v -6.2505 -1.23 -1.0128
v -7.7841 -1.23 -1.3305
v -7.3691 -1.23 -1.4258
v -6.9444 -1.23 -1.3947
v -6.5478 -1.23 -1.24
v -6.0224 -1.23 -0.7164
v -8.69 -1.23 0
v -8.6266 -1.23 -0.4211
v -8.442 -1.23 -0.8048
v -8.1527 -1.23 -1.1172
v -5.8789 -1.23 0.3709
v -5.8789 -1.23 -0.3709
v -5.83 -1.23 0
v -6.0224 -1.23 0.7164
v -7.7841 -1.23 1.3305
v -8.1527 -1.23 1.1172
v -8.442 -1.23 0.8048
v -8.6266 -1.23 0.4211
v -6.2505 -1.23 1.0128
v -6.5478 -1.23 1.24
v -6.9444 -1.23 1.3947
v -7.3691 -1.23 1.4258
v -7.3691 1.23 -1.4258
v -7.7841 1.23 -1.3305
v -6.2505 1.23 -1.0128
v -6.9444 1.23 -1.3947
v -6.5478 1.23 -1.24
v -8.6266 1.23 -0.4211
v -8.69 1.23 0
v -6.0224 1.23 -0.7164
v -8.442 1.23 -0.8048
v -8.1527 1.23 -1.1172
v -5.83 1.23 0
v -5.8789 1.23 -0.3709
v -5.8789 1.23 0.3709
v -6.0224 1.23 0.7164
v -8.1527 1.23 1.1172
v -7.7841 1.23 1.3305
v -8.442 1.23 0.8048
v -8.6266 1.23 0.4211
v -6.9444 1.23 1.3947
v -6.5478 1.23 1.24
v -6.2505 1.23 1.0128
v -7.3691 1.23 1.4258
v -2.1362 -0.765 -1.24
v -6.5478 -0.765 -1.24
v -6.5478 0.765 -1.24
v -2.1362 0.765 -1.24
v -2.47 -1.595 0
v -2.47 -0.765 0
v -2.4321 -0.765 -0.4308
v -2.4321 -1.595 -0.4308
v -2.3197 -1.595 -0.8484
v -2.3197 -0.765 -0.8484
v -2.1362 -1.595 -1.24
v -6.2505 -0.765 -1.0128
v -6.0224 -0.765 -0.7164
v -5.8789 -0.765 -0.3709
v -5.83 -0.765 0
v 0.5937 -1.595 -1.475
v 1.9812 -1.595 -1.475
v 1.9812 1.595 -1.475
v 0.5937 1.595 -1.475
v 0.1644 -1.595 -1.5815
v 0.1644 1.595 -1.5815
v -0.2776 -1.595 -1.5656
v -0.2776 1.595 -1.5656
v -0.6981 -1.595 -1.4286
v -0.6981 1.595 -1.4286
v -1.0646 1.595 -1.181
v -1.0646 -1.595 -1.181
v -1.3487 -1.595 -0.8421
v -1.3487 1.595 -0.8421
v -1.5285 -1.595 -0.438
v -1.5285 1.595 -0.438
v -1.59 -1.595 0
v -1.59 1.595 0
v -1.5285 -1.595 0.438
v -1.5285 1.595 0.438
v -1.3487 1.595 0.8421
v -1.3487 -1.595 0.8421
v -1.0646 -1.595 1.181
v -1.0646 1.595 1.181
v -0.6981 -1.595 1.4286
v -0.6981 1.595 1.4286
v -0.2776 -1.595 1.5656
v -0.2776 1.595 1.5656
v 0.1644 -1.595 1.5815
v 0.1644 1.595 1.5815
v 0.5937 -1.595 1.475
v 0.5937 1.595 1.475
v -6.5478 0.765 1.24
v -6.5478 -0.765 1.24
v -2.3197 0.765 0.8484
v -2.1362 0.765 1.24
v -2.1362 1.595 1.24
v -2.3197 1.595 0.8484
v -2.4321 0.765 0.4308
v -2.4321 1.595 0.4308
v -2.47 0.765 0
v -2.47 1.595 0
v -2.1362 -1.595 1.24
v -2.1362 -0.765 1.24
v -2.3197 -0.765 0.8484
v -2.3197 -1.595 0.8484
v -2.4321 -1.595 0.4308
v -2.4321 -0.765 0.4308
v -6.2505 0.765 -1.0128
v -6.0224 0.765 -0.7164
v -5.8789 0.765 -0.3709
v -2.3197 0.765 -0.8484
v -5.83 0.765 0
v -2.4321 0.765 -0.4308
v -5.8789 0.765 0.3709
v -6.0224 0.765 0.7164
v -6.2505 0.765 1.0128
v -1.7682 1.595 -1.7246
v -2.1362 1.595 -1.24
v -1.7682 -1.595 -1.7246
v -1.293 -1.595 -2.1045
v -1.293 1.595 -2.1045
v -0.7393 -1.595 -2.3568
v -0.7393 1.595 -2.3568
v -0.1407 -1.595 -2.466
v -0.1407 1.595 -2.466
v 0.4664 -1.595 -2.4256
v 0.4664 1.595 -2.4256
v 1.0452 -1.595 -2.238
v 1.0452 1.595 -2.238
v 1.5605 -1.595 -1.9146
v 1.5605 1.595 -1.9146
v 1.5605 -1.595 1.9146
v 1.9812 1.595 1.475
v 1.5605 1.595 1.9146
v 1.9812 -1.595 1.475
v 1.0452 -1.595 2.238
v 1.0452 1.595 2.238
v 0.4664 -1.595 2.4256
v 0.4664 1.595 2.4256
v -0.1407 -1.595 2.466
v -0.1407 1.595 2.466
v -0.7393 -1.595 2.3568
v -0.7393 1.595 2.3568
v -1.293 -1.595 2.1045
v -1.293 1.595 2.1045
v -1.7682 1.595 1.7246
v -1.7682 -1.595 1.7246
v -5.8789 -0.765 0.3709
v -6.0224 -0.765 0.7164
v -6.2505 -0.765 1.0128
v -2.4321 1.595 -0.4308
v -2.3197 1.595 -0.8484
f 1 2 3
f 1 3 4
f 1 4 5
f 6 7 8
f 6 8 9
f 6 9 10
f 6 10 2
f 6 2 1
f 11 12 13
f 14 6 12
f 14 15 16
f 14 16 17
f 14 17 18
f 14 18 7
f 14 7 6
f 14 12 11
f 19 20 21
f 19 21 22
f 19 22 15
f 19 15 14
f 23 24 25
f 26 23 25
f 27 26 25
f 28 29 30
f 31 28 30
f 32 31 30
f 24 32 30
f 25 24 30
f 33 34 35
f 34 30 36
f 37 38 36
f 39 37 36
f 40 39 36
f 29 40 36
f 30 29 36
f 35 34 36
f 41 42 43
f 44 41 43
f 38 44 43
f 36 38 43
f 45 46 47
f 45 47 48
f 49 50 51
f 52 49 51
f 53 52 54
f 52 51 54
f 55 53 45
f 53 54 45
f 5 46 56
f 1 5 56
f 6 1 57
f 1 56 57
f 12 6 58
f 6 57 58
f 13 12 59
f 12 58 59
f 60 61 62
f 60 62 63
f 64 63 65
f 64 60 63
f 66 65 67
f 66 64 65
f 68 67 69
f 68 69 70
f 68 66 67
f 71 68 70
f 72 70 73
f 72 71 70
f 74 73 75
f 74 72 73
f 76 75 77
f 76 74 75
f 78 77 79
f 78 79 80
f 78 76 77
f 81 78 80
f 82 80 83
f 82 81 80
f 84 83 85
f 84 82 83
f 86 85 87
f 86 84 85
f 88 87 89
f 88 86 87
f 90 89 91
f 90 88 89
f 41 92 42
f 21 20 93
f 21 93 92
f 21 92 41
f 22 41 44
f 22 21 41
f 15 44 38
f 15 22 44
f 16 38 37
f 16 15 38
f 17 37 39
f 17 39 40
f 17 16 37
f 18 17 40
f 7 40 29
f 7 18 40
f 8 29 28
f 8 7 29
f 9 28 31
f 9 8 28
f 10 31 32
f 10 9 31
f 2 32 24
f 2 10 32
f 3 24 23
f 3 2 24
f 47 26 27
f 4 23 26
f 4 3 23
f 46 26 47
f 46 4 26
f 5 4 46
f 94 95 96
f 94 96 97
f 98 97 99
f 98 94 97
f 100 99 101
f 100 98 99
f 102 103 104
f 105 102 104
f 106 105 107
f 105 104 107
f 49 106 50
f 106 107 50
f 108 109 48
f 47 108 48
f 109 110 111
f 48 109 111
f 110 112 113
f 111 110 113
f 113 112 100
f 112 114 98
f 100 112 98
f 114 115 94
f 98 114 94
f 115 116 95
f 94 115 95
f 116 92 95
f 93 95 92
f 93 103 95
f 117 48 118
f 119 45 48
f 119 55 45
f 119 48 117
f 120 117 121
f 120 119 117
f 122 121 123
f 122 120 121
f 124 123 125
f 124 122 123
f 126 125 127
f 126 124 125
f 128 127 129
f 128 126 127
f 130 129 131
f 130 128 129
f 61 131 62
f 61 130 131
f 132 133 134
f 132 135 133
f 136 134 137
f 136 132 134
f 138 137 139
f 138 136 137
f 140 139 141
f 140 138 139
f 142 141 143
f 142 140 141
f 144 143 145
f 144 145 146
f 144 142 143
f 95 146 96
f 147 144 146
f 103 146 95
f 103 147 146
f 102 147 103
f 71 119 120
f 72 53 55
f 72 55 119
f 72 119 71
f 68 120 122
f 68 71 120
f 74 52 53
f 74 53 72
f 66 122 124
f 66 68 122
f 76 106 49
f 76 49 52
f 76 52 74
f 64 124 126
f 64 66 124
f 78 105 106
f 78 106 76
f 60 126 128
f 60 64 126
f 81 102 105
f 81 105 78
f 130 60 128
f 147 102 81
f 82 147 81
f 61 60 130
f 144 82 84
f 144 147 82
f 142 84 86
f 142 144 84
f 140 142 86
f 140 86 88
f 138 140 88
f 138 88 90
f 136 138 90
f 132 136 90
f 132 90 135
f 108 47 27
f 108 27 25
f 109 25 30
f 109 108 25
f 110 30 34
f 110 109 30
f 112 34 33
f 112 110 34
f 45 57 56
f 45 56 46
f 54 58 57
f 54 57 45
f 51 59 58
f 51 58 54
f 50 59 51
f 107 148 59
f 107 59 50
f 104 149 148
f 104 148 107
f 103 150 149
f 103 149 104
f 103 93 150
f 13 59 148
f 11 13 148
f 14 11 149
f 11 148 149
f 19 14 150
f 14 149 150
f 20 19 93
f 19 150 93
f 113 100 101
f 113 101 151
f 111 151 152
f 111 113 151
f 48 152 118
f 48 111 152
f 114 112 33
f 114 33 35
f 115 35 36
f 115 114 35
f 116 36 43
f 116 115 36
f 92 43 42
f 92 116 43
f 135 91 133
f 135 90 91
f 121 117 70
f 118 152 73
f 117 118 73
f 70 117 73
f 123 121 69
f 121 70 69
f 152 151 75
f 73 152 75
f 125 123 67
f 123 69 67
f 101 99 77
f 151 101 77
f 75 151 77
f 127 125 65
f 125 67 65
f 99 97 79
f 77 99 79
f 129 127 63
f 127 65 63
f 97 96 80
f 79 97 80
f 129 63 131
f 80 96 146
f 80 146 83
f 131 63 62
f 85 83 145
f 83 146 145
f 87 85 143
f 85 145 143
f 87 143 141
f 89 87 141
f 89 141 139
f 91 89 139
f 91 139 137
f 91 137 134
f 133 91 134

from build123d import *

# Parameters (mm, degrees)
F1_DEPTH = 1.23
F2_DEPTH = 0.765
F3_DEPTH = 1.595
F4_DEPTH = 1.595
F5_DEPTH = 0.765
F6_DEPTH = 1.23


with BuildPart() as f1:
    # F0 (on Front) → F1 (new body)
    with BuildSketch(Plane.XZ):
        with BuildLine():
            ThreePointArc((-6.54775, -1.24), (-6.022378, -0.716374), (-5.83, 0))
            ThreePointArc((-5.83, 0), (-6.022378, 0.716374), (-6.54775, 1.24))
            ThreePointArc((-6.54775, 1.24), (-8.69, 0), (-6.54775, -1.24))
        make_face()
    extrude(amount=F1_DEPTH)

    # F0 (on Front) → F2 (join)
    with BuildSketch(Plane.XZ):
        with BuildLine():
            Line((-5.83, 0), (-5.83, 1.24))
            Line((-5.83, 1.24), (-6.54775, 1.24))
            ThreePointArc((-6.54775, 1.24), (-6.022378, 0.716374), (-5.83, 0))
        make_face()
        with BuildLine():
            Line((-6.54775, -1.24), (-5.83, -1.24))
            Line((-5.83, -1.24), (-5.83, 0))
            ThreePointArc((-5.83, 0), (-6.022378, -0.716374), (-6.54775, -1.24))
        make_face()
        with BuildLine():
            ThreePointArc((-2.47, 0), (-2.385088, 0.642073), (-2.136188, 1.24))
            Line((-2.136188, 1.24), (-5.83, 1.24))
            Line((-5.83, 1.24), (-5.83, 0))
            Line((-5.83, 0), (-2.47, 0))
        make_face()
        with BuildLine():
            Line((-5.83, -1.24), (-2.136188, -1.24))
            ThreePointArc((-2.136188, -1.24), (-2.385088, -0.642073), (-2.47, 0))
            Line((-2.47, 0), (-5.83, 0))
            Line((-5.83, 0), (-5.83, -1.24))
        make_face()
    extrude(amount=F2_DEPTH)

    # F0 (on Front) → F3 (join)
    with BuildSketch(Plane.XZ):
        with BuildLine():
            Line((1.7075, 1.475), (1.981231, 1.475))
            ThreePointArc((1.981231, 1.475), (-0.140745, 2.465987), (-2.136188, 1.24))
            ThreePointArc((-2.136188, 1.24), (-2.385088, 0.642073), (-2.47, 0))
            ThreePointArc((-2.47, 0), (-2.385088, -0.642073), (-2.136188, -1.24))
            ThreePointArc((-2.136188, -1.24), (-0.140745, -2.465987), (1.981231, -1.475))
            Line((1.981231, -1.475), (1.7075, -1.475))
            Line((1.7075, -1.475), (0.593696, -1.475))
            ThreePointArc((0.593696, -1.475), (-1.59, 0), (0.593696, 1.475))
            Line((0.593696, 1.475), (1.7075, 1.475))
        make_face()
    extrude(amount=F3_DEPTH)

    # F0 (on Front) → F4 (join)
    with BuildSketch(Plane.XZ):
        with BuildLine():
            Line((1.7075, 1.475), (1.981231, 1.475))
            ThreePointArc((1.981231, 1.475), (-0.140745, 2.465987), (-2.136188, 1.24))
            ThreePointArc((-2.136188, 1.24), (-2.385088, 0.642073), (-2.47, 0))
            ThreePointArc((-2.47, 0), (-2.385088, -0.642073), (-2.136188, -1.24))
            ThreePointArc((-2.136188, -1.24), (-0.140745, -2.465987), (1.981231, -1.475))
            Line((1.981231, -1.475), (1.7075, -1.475))
            Line((1.7075, -1.475), (0.593696, -1.475))
            ThreePointArc((0.593696, -1.475), (-1.59, 0), (0.593696, 1.475))
            Line((0.593696, 1.475), (1.7075, 1.475))
        make_face()
    extrude(amount=-F4_DEPTH)

    # F0 (on Front) → F5 (join)
    with BuildSketch(Plane.XZ):
        with BuildLine():
            Line((-6.54775, -1.24), (-5.83, -1.24))
            Line((-5.83, -1.24), (-5.83, 0))
            ThreePointArc((-5.83, 0), (-6.022378, -0.716374), (-6.54775, -1.24))
        make_face()
        with BuildLine():
            Line((-5.83, 0), (-5.83, 1.24))
            Line((-5.83, 1.24), (-6.54775, 1.24))
            ThreePointArc((-6.54775, 1.24), (-6.022378, 0.716374), (-5.83, 0))
        make_face()
        with BuildLine():
            ThreePointArc((-2.47, 0), (-2.385088, 0.642073), (-2.136188, 1.24))
            Line((-2.136188, 1.24), (-5.83, 1.24))
            Line((-5.83, 1.24), (-5.83, 0))
            Line((-5.83, 0), (-2.47, 0))
        make_face()
        with BuildLine():
            Line((-5.83, -1.24), (-2.136188, -1.24))
            ThreePointArc((-2.136188, -1.24), (-2.385088, -0.642073), (-2.47, 0))
            Line((-2.47, 0), (-5.83, 0))
            Line((-5.83, 0), (-5.83, -1.24))
        make_face()
    extrude(amount=-F5_DEPTH)

    # F0 (on Front) → F6 (join)
    with BuildSketch(Plane.XZ):
        with BuildLine():
            ThreePointArc((-6.54775, -1.24), (-6.022378, -0.716374), (-5.83, 0))
            ThreePointArc((-5.83, 0), (-6.022378, 0.716374), (-6.54775, 1.24))
            ThreePointArc((-6.54775, 1.24), (-8.69, 0), (-6.54775, -1.24))
        make_face()
    extrude(amount=-F6_DEPTH)


solid = f1.part
